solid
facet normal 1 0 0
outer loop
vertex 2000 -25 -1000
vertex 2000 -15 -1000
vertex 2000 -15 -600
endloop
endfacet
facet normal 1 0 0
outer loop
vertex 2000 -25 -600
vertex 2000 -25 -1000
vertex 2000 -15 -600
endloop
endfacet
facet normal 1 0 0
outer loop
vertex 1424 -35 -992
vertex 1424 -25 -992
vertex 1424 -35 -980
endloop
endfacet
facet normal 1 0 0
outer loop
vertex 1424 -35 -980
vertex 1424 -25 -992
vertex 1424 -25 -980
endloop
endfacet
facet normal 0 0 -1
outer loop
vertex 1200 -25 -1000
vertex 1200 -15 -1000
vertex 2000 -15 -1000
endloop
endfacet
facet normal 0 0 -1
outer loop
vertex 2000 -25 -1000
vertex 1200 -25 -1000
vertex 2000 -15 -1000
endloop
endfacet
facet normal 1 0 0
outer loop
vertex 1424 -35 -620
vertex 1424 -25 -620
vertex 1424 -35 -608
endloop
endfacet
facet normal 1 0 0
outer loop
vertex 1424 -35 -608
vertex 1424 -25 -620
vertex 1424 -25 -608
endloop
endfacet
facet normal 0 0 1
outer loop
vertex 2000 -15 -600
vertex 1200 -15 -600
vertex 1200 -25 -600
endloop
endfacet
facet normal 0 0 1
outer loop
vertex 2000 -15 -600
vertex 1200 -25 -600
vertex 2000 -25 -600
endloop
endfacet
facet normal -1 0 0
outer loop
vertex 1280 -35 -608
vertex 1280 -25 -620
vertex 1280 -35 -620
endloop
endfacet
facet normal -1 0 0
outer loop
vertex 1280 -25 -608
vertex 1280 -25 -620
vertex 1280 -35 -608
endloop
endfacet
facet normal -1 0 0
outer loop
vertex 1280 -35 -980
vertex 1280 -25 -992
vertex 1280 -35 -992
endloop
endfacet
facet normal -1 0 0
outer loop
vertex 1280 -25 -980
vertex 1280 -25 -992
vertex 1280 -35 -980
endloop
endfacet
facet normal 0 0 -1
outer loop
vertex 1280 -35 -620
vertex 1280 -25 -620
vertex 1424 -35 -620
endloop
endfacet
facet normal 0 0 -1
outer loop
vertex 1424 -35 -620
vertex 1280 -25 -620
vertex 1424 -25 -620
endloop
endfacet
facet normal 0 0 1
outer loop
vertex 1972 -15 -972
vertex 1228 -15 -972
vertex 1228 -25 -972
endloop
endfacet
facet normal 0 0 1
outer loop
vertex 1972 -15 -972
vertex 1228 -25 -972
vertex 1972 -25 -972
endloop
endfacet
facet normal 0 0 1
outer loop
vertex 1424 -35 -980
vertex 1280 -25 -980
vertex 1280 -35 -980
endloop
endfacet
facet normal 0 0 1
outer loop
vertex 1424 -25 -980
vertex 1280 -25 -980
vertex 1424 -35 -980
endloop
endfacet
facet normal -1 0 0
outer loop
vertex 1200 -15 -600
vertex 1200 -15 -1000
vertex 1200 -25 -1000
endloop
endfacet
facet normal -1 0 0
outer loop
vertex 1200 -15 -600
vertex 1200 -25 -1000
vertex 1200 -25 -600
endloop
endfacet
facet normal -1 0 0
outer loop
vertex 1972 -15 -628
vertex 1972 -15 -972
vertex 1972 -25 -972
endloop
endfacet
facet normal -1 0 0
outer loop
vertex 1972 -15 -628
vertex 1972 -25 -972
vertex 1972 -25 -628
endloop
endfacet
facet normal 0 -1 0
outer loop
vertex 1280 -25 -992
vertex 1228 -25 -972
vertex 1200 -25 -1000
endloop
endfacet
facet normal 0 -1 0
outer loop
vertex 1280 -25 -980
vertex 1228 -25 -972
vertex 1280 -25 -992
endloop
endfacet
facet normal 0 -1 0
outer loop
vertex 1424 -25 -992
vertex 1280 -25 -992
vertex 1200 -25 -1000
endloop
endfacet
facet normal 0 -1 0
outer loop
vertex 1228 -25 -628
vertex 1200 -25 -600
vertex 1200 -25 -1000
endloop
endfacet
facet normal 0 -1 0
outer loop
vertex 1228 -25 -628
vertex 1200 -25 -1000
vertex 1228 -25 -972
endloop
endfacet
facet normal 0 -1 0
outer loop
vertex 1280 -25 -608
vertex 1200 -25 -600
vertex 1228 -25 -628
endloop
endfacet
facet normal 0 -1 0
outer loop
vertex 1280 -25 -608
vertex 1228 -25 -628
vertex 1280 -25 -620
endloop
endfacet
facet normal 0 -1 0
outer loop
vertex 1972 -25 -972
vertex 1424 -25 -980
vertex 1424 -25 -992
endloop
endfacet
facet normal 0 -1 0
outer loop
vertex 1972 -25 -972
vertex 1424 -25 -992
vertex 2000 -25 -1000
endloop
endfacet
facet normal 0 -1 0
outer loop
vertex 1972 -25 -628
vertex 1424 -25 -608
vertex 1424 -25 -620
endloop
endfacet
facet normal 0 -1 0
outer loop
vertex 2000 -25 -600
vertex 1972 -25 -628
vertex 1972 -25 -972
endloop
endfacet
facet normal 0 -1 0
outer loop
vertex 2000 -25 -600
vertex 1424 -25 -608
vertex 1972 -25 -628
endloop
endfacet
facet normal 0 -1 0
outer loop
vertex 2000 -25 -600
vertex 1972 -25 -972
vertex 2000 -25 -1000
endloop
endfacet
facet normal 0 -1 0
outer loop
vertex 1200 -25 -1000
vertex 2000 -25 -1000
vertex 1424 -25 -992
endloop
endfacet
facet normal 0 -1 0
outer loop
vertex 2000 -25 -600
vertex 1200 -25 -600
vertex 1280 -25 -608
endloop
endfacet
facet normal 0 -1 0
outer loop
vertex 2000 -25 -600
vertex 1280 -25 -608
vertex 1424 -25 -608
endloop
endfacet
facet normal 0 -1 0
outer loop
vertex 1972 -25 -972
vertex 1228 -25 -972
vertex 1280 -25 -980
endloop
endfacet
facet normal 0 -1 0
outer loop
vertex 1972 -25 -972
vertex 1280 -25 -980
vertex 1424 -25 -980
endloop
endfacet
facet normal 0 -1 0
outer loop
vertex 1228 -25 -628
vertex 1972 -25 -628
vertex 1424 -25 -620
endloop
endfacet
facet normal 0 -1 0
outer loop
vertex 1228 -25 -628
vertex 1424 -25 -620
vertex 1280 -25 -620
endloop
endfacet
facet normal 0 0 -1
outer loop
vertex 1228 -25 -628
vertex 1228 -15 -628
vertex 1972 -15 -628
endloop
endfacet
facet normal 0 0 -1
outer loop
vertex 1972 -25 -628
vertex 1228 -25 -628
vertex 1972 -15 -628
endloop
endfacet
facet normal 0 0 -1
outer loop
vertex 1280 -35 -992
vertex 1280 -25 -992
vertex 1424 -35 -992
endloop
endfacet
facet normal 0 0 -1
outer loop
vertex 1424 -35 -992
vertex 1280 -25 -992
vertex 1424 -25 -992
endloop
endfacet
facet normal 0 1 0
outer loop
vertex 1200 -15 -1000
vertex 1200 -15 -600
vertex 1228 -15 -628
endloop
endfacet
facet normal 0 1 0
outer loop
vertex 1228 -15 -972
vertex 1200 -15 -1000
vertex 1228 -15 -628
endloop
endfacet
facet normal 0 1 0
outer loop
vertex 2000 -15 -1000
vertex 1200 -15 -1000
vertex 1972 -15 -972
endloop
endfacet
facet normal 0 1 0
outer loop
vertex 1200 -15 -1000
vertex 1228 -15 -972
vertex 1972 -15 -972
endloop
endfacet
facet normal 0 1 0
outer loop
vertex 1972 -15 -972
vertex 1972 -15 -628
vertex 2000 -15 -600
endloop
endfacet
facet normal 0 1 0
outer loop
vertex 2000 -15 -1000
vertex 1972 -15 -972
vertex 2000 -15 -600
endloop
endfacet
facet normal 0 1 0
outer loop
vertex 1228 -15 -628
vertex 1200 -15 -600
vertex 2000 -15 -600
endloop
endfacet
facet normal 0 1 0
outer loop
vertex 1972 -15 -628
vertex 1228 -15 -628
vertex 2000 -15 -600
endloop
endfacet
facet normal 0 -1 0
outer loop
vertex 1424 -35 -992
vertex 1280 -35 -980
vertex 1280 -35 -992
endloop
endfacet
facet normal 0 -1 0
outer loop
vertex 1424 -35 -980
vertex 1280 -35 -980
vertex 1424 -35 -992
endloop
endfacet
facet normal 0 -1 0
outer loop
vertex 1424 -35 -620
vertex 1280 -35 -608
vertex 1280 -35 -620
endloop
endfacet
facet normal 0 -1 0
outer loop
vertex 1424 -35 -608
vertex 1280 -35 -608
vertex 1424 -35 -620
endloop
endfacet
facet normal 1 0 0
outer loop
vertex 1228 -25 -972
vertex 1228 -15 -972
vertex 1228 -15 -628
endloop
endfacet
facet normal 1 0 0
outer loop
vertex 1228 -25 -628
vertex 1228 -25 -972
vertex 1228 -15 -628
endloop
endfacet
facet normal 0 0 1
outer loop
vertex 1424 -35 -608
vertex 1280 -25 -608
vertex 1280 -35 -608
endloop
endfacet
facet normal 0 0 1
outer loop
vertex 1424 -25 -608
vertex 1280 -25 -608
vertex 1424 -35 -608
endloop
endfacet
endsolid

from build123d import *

# Parameters (mm, degrees)
F0_W     = 2000
F0_H     = 1000
F0_W_2   = 1860
F0_H_2   = 860
F1_DEPTH = 25
F2_W     = 360
F2_H     = 30
F3_DEPTH = 25
F4_SCALE = 0.4


with BuildPart() as f1:
    # F0 (on Front) → F1 (new body)
    with BuildSketch(Plane.XZ):
        with Locations((1000, -500)):
            Rectangle(F0_W, F0_H)
        with Locations((1000, -500)):
            Rectangle(F0_W_2, F0_H_2, mode=Mode.SUBTRACT)
    extrude(amount=F1_DEPTH)

    # F2 (on face) → F3 (join)
    with BuildSketch(Plane.XZ.offset(25)):
        with Locations((380, -35)):
            Rectangle(F2_W, F2_H)
        with Locations((380, -965)):
            Rectangle(F2_W, F2_H)
    extrude(amount=F3_DEPTH)


with BuildPart() as f1_1:
    # F4: moved
    add(f1.part.scale(F4_SCALE).moved(Location((1200, -15, -600))))


solid = f1_1.part
